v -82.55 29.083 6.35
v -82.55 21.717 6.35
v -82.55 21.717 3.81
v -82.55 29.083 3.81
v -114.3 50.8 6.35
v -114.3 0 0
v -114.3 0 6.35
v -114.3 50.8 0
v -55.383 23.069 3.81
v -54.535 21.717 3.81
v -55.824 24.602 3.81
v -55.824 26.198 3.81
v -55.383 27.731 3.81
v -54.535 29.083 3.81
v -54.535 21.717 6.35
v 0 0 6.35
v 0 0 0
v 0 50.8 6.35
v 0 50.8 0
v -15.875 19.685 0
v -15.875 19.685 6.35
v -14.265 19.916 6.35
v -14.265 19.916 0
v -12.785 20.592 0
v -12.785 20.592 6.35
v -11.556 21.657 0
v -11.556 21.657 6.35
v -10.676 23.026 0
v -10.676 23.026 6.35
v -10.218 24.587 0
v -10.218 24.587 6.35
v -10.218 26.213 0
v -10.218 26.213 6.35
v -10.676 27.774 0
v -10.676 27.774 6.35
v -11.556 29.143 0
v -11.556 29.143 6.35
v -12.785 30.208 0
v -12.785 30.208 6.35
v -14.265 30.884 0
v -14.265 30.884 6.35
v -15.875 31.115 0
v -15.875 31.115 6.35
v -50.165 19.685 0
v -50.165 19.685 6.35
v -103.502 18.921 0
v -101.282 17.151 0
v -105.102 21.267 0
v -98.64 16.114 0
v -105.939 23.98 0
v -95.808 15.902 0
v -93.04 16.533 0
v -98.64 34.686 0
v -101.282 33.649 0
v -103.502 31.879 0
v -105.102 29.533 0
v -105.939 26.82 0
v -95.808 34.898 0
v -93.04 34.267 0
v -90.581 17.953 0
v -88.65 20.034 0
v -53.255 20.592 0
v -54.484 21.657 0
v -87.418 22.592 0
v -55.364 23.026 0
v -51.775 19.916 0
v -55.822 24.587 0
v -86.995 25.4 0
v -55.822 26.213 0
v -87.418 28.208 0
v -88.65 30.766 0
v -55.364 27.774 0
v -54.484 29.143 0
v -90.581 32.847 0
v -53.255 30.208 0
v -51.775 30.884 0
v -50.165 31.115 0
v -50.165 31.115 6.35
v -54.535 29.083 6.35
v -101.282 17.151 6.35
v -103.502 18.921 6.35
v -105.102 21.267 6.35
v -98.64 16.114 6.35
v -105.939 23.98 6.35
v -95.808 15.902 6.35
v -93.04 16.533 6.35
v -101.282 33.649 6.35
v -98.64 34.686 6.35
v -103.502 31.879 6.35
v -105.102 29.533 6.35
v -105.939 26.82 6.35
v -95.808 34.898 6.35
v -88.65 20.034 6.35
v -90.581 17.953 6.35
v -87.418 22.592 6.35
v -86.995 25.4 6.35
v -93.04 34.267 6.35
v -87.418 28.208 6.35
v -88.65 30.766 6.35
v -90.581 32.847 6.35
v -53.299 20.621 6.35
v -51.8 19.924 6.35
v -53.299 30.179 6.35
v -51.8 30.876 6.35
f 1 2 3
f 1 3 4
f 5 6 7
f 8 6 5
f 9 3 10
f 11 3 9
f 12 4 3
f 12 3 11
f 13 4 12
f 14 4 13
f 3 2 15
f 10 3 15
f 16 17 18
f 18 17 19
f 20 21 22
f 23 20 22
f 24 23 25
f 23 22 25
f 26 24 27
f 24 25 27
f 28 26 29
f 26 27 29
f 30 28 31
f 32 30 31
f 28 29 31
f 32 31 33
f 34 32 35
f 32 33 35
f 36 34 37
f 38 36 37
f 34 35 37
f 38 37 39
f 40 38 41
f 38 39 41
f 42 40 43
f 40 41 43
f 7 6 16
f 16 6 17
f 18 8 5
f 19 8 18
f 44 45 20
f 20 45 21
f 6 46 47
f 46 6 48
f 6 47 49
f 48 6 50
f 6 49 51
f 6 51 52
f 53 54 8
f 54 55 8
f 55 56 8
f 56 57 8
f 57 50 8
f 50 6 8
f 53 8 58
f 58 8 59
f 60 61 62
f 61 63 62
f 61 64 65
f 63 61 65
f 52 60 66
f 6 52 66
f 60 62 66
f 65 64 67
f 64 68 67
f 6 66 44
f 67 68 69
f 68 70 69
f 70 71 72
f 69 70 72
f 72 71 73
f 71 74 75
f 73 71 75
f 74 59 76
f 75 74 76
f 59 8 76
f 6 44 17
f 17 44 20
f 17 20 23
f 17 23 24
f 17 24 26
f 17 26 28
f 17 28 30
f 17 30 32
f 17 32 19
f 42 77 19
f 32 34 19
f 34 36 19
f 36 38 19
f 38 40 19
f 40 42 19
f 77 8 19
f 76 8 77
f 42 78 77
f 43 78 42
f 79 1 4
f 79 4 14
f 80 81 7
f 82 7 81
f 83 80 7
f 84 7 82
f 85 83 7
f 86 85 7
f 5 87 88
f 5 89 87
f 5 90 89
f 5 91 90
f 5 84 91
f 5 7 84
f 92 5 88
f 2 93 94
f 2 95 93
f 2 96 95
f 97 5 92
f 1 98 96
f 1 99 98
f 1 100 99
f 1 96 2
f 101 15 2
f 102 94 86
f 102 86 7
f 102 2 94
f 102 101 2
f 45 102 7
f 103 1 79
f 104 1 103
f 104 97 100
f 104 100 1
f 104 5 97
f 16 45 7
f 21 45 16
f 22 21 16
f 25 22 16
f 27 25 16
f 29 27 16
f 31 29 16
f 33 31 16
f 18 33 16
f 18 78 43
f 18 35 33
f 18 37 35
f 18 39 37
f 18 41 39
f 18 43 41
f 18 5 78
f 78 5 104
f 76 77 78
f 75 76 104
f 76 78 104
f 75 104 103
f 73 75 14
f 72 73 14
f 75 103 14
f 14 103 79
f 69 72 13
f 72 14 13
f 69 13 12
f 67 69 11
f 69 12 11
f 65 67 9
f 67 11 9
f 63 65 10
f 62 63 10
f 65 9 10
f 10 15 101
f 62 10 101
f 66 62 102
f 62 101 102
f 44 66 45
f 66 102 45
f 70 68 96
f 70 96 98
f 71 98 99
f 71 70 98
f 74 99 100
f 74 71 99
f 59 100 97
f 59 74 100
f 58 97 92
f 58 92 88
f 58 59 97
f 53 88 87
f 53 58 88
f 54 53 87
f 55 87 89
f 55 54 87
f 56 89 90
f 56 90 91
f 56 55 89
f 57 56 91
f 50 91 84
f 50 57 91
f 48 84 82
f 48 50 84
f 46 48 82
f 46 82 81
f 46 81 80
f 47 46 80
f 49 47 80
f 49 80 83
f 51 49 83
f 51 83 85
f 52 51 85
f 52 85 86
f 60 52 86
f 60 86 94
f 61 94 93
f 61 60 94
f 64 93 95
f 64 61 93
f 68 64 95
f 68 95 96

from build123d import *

# Parameters (mm, degrees)
F0_W     = 114.3
F0_H     = 50.8
F0_R     = 9.525
F1_DEPTH = 6.35
F2_W     = 34.29
F2_H     = 11.43
F3_DEPTH = 25.4
F4_W     = 53.34
F4_H     = 7.366
F5_DEPTH = 2.54


with BuildPart() as f1:
    # F0 (on Top) → F1 (new body)
    with BuildSketch(Plane.XY):
        with Locations((-57.15, 25.4)):
            Rectangle(F0_W, F0_H)
        with Locations((-96.52, 25.4)):
            Circle(F0_R, mode=Mode.SUBTRACT)
    extrude(amount=F1_DEPTH)

    # F2 (on face) → F3 (cut)
    with BuildSketch(Plane.XY.offset(6.35)):
        with Locations((-33.02, 25.4)):
            Rectangle(F2_W, F2_H)
        with BuildLine():
            Line((-50.165, 19.685), (-50.165, 31.115))
            ThreePointArc((-50.165, 31.115), (-55.88, 25.4), (-50.165, 19.685))
        make_face()
        with BuildLine():
            ThreePointArc((-15.875, 19.685), (-10.16, 25.4), (-15.875, 31.115))
            Line((-15.875, 31.115), (-15.875, 19.685))
        make_face()
    extrude(amount=-F3_DEPTH, mode=Mode.SUBTRACT)

    # F4 (on face) → F5 (cut)
    with BuildSketch(Plane.XY.offset(6.35)):
        with Locations((-55.88, 25.4)):
            Rectangle(F4_W, F4_H)
    extrude(amount=-F5_DEPTH, mode=Mode.SUBTRACT)


solid = f1.part
